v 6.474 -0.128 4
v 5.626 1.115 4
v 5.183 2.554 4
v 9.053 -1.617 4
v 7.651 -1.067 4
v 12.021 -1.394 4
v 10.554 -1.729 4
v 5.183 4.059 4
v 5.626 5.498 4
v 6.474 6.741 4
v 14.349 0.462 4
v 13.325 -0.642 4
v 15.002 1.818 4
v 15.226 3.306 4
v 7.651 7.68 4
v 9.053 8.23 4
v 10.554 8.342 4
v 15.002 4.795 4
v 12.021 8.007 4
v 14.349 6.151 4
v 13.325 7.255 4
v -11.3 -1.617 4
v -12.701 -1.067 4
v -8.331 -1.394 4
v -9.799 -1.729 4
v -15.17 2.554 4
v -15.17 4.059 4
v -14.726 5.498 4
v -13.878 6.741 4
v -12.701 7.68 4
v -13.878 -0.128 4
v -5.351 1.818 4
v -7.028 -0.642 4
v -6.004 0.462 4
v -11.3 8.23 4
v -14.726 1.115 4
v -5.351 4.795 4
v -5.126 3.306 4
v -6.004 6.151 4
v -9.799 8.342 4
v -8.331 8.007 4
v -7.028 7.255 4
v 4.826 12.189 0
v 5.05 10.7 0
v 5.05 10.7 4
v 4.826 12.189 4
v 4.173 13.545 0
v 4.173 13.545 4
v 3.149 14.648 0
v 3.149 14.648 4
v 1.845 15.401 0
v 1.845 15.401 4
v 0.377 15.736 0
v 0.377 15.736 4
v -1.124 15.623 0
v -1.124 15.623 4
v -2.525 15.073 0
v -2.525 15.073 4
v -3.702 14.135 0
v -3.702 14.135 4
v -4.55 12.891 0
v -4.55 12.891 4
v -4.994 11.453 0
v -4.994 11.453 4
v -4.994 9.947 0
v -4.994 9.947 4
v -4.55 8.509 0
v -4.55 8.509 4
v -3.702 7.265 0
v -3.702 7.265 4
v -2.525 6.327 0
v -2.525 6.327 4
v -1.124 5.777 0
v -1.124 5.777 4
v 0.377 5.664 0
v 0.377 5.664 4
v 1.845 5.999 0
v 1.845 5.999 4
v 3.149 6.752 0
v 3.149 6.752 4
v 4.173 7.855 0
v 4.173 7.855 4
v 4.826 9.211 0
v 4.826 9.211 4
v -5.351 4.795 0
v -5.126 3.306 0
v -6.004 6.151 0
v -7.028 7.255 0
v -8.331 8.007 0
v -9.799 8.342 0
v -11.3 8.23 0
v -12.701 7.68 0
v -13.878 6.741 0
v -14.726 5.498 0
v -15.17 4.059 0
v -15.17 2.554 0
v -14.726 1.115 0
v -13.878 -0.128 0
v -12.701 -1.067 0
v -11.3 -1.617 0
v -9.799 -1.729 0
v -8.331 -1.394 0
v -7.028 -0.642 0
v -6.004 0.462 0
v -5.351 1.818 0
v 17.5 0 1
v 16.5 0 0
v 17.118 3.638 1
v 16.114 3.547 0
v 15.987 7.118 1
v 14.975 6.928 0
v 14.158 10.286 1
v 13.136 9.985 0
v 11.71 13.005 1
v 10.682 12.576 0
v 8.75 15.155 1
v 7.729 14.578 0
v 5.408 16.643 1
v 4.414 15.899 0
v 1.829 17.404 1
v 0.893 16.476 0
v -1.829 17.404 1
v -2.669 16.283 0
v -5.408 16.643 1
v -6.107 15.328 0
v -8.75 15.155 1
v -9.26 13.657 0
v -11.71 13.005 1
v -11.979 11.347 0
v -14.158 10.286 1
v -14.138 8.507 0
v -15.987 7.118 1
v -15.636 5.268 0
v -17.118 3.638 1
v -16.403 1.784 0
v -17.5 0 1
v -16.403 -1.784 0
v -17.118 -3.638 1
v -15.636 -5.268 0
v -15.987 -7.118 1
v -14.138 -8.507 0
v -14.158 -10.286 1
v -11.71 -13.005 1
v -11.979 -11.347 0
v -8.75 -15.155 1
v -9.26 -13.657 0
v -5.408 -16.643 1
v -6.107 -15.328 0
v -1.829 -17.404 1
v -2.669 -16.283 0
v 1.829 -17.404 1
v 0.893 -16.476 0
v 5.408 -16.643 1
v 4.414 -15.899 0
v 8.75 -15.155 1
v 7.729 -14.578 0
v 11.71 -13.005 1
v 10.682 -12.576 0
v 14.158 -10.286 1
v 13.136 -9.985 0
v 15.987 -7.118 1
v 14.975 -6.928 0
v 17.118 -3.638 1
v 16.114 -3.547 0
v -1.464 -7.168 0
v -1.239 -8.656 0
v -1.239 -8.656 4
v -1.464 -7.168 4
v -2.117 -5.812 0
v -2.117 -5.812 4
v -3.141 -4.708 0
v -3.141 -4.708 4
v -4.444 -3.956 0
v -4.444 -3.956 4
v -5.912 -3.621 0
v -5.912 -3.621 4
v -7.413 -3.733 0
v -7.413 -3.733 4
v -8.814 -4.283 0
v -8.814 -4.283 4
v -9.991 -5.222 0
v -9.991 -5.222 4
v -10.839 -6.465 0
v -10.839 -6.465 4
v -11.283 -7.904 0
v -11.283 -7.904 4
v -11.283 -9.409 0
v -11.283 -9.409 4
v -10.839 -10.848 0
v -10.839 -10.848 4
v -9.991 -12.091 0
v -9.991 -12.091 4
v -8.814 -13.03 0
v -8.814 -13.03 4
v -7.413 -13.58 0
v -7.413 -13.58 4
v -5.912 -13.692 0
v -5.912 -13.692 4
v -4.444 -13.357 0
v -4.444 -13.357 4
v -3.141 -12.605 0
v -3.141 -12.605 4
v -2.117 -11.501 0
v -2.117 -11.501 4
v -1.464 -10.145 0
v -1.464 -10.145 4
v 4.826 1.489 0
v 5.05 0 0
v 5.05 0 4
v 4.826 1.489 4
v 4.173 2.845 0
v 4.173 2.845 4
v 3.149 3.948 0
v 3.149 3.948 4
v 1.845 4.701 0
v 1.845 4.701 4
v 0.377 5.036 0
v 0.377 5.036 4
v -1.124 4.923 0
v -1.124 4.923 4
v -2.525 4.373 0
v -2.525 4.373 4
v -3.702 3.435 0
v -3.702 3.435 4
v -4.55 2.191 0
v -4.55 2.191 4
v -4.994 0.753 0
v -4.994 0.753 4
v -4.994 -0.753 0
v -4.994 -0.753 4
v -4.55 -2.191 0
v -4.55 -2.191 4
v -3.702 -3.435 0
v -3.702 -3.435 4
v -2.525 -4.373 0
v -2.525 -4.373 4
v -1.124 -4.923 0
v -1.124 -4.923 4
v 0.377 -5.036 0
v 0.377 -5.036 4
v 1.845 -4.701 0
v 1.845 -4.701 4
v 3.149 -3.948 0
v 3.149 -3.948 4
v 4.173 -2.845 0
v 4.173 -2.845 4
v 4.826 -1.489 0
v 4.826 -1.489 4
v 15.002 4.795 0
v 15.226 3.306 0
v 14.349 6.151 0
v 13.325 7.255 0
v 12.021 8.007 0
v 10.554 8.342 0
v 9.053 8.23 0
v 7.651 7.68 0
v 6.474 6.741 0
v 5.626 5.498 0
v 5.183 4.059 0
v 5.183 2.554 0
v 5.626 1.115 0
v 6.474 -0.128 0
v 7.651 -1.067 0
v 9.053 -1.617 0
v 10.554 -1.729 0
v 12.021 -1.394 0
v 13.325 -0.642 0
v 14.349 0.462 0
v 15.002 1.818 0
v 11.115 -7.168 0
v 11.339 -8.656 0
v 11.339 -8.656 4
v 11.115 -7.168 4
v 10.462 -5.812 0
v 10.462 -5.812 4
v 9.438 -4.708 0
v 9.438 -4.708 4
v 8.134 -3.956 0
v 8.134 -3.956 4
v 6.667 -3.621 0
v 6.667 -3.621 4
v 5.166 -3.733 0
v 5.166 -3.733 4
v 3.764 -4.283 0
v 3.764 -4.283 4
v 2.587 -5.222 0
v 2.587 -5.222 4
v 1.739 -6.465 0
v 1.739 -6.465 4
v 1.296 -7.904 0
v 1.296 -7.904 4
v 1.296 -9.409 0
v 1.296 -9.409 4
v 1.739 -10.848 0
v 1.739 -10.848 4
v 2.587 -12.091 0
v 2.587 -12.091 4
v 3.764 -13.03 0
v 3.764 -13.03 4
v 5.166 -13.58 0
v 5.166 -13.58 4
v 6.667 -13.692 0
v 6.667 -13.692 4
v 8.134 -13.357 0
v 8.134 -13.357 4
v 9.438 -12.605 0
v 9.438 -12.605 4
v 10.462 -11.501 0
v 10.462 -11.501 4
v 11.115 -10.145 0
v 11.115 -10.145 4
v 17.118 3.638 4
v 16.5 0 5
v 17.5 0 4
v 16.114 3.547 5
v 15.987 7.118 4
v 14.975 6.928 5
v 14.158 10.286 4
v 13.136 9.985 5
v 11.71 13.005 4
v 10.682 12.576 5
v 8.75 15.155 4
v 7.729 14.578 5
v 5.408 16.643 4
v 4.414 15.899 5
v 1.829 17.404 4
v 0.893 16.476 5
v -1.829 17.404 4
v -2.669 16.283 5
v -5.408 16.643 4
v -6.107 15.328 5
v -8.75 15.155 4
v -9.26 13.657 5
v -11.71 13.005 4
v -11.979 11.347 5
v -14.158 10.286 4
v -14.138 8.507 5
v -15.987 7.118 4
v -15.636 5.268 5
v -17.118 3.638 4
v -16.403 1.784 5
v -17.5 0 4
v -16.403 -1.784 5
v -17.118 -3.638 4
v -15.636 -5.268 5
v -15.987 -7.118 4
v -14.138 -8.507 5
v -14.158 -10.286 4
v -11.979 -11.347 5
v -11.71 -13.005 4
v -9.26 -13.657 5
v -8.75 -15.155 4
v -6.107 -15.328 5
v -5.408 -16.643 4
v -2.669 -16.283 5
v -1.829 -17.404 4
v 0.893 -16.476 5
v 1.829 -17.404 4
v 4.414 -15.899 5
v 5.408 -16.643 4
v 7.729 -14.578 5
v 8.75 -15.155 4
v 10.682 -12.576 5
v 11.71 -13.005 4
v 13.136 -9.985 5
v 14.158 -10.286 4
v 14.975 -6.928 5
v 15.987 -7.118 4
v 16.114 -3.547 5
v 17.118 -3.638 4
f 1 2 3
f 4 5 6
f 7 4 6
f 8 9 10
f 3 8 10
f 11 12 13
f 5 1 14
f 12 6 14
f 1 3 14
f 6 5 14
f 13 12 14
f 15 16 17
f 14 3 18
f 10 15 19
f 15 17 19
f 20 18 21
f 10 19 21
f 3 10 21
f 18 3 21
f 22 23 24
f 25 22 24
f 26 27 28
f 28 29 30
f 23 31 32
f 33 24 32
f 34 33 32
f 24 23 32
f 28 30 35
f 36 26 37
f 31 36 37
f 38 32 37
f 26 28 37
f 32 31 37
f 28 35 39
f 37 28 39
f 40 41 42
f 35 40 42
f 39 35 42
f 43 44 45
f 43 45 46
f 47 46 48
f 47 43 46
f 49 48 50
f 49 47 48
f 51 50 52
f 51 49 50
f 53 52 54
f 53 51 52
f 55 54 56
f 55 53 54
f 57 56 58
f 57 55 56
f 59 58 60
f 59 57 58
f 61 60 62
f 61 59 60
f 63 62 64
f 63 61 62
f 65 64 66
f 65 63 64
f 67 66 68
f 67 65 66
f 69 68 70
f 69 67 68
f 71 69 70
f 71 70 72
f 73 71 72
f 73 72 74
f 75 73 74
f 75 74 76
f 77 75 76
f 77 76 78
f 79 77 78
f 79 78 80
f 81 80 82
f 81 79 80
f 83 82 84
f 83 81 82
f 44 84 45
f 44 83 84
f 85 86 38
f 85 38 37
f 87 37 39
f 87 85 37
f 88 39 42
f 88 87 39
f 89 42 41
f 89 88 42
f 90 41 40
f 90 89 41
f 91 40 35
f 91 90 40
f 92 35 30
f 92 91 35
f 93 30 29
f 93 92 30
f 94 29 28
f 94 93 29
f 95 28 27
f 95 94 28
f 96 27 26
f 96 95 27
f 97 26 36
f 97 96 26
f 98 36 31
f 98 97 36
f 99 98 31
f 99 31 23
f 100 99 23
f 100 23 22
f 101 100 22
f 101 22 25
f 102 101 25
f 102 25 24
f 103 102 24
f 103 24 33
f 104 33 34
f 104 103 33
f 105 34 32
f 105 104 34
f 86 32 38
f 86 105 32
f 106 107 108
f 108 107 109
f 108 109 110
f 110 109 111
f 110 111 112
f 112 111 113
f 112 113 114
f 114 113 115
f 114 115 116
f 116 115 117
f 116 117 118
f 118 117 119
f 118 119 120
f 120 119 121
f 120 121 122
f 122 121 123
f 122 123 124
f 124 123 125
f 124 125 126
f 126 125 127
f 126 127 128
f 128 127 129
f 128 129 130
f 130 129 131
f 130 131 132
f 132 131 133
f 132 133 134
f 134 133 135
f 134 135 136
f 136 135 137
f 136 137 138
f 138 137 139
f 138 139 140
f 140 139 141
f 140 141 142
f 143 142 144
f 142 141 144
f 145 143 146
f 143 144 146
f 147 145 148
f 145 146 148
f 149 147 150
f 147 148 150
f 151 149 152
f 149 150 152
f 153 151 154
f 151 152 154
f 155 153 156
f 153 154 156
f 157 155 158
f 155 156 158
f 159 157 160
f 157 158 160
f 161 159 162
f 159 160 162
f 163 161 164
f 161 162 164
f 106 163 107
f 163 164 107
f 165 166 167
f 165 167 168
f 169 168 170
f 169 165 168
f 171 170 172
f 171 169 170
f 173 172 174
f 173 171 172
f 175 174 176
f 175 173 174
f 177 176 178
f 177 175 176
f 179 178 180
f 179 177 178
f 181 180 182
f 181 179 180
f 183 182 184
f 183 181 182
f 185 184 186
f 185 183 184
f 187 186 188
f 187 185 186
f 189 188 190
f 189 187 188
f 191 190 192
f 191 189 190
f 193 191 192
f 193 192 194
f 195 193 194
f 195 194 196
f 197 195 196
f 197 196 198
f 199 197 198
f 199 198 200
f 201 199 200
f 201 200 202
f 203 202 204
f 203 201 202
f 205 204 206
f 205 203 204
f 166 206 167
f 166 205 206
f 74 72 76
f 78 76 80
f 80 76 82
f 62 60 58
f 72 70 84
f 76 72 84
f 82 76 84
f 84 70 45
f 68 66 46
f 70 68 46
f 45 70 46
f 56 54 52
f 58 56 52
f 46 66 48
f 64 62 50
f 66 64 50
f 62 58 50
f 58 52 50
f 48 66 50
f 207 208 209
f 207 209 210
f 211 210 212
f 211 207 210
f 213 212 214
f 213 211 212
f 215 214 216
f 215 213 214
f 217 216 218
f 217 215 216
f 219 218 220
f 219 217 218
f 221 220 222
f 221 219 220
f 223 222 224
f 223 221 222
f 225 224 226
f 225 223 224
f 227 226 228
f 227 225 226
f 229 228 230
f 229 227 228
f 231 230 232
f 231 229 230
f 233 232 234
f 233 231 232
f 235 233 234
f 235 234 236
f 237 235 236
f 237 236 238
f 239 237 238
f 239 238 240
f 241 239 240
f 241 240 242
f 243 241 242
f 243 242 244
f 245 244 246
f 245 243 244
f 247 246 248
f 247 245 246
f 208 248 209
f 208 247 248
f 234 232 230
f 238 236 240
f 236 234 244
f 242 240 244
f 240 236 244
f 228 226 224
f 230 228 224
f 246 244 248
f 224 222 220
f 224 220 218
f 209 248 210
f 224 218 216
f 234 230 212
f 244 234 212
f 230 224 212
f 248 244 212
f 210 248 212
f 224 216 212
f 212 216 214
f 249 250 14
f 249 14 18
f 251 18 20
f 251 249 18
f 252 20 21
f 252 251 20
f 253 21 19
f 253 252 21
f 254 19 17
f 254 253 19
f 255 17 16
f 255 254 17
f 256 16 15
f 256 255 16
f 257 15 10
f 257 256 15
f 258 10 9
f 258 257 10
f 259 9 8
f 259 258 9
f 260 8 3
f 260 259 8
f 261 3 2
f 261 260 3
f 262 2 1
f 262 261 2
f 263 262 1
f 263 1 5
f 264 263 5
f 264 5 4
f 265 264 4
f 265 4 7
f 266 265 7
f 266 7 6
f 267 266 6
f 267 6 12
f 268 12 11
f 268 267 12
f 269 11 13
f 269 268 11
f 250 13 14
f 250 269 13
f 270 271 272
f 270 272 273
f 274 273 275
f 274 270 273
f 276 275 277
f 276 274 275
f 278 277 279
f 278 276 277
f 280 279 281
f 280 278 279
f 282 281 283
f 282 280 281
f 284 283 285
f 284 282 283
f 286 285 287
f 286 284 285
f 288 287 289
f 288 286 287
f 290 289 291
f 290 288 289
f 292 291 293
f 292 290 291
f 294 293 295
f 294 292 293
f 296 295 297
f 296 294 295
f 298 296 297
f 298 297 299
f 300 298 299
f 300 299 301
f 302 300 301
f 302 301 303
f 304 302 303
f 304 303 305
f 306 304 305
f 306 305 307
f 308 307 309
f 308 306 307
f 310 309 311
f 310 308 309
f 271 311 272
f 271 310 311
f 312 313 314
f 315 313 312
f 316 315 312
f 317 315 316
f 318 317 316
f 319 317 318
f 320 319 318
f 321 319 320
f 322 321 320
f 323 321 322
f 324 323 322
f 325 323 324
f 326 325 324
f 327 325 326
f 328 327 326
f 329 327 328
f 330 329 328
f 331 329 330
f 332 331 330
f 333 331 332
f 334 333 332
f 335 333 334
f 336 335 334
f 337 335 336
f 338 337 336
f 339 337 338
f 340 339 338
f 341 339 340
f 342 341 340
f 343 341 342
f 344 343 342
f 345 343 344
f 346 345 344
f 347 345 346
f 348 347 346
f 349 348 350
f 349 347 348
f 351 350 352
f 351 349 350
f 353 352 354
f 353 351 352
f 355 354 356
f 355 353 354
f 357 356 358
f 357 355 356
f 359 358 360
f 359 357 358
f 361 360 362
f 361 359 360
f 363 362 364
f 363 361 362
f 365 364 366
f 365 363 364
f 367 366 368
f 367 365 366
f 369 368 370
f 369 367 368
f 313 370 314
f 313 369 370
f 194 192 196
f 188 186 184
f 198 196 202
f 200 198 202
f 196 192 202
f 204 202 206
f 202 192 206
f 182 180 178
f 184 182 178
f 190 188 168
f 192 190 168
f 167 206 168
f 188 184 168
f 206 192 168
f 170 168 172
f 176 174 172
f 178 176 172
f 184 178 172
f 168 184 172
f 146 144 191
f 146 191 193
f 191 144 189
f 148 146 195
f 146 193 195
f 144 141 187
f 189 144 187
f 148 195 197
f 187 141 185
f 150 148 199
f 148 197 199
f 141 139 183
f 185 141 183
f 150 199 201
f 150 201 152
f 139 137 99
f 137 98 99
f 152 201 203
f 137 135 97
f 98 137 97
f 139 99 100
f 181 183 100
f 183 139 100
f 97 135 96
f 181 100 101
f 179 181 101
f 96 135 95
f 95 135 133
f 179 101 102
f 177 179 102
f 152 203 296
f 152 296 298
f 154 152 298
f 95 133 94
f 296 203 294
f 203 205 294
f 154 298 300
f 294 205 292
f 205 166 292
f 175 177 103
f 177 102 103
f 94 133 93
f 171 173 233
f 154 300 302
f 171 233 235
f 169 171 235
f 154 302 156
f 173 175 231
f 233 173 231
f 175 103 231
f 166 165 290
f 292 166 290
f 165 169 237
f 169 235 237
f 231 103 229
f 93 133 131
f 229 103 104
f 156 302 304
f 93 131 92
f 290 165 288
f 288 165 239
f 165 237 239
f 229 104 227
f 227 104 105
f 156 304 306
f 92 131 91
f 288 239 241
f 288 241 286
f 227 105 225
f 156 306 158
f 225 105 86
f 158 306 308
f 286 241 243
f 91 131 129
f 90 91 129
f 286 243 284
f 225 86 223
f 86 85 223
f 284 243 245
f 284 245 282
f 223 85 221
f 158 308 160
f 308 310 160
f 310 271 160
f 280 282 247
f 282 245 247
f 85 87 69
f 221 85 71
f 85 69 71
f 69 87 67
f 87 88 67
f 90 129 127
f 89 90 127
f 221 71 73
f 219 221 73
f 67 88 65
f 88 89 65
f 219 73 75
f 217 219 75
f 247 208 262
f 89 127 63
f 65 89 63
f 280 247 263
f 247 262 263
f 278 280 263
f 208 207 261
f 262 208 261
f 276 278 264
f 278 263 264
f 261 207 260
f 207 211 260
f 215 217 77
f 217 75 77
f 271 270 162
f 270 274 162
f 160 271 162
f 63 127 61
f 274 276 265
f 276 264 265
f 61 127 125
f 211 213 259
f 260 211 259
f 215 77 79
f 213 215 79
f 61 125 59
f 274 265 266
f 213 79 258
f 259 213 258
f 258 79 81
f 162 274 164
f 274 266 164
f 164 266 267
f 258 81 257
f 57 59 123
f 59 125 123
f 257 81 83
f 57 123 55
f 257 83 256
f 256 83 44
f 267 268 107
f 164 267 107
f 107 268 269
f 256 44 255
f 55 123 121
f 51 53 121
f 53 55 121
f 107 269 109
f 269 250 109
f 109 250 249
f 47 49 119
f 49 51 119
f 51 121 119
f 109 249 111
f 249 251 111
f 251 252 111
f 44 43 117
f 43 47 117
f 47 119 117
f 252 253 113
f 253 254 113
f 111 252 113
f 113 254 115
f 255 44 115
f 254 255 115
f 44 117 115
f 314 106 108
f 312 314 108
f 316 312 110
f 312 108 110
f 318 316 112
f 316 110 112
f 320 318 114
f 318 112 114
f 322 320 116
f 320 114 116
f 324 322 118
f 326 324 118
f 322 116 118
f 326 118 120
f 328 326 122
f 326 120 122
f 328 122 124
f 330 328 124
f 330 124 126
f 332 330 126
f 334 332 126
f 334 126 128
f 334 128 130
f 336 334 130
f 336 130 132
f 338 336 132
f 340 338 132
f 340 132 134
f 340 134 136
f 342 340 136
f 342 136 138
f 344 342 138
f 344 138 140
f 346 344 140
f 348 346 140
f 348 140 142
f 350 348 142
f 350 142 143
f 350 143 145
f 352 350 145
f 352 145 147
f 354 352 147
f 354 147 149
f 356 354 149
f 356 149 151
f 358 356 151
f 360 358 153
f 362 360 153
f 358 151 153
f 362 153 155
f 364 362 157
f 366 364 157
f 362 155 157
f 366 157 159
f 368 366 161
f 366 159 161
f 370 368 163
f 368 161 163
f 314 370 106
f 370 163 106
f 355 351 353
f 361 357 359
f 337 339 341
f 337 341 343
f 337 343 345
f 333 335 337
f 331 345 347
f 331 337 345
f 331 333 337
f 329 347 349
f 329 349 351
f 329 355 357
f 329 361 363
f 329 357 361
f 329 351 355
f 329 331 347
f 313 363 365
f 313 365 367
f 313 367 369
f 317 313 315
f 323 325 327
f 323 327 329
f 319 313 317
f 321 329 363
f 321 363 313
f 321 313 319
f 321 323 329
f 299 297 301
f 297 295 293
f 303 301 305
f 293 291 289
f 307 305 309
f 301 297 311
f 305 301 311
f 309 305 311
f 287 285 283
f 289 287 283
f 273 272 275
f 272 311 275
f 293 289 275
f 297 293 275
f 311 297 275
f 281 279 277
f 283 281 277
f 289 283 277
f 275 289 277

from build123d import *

# Parameters (mm, degrees)
F0_R     = 17.5
F0_R_2   = 5.05
F1_DEPTH = 4
F2_R     = 17.5
F3_DEPTH = 1
F4_SIZE  = 1
F5_SIZE  = 1


with BuildPart() as f1:
    # F0 (on Top) → F1 (new body)
    with BuildSketch(Plane.XY):
        Circle(F0_R)
        with Locations((-6.289302, -8.656482)):
            Circle(F0_R_2, mode=Mode.SUBTRACT)
        with Locations((6.289302, -8.656482)):
            Circle(F0_R_2, mode=Mode.SUBTRACT)
        with Locations((-10.176305, 3.306482)):
            Circle(F0_R_2, mode=Mode.SUBTRACT)
        Circle(F0_R_2, mode=Mode.SUBTRACT)
        with Locations((10.176305, 3.306482)):
            Circle(F0_R_2, mode=Mode.SUBTRACT)
        with Locations((0, 10.7)):
            Circle(F0_R_2, mode=Mode.SUBTRACT)
    extrude(amount=F1_DEPTH)

    # F2 (on face) → F3 (join)
    with BuildSketch(Plane.XY.offset(4)):
        Circle(F2_R)
    extrude(amount=F3_DEPTH)

    # F4
    f4_edges = [f1.edges().sort_by_distance(p)[0] for p in [
        (-17.5, 0, 0),
    ]]
    chamfer(f4_edges, length=F4_SIZE)

    # F5
    f5_edges = [f1.edges().sort_by_distance(p)[0] for p in [
        (-17.5, 0, 5),
    ]]
    chamfer(f5_edges, length=F5_SIZE)


solid = f1.part
